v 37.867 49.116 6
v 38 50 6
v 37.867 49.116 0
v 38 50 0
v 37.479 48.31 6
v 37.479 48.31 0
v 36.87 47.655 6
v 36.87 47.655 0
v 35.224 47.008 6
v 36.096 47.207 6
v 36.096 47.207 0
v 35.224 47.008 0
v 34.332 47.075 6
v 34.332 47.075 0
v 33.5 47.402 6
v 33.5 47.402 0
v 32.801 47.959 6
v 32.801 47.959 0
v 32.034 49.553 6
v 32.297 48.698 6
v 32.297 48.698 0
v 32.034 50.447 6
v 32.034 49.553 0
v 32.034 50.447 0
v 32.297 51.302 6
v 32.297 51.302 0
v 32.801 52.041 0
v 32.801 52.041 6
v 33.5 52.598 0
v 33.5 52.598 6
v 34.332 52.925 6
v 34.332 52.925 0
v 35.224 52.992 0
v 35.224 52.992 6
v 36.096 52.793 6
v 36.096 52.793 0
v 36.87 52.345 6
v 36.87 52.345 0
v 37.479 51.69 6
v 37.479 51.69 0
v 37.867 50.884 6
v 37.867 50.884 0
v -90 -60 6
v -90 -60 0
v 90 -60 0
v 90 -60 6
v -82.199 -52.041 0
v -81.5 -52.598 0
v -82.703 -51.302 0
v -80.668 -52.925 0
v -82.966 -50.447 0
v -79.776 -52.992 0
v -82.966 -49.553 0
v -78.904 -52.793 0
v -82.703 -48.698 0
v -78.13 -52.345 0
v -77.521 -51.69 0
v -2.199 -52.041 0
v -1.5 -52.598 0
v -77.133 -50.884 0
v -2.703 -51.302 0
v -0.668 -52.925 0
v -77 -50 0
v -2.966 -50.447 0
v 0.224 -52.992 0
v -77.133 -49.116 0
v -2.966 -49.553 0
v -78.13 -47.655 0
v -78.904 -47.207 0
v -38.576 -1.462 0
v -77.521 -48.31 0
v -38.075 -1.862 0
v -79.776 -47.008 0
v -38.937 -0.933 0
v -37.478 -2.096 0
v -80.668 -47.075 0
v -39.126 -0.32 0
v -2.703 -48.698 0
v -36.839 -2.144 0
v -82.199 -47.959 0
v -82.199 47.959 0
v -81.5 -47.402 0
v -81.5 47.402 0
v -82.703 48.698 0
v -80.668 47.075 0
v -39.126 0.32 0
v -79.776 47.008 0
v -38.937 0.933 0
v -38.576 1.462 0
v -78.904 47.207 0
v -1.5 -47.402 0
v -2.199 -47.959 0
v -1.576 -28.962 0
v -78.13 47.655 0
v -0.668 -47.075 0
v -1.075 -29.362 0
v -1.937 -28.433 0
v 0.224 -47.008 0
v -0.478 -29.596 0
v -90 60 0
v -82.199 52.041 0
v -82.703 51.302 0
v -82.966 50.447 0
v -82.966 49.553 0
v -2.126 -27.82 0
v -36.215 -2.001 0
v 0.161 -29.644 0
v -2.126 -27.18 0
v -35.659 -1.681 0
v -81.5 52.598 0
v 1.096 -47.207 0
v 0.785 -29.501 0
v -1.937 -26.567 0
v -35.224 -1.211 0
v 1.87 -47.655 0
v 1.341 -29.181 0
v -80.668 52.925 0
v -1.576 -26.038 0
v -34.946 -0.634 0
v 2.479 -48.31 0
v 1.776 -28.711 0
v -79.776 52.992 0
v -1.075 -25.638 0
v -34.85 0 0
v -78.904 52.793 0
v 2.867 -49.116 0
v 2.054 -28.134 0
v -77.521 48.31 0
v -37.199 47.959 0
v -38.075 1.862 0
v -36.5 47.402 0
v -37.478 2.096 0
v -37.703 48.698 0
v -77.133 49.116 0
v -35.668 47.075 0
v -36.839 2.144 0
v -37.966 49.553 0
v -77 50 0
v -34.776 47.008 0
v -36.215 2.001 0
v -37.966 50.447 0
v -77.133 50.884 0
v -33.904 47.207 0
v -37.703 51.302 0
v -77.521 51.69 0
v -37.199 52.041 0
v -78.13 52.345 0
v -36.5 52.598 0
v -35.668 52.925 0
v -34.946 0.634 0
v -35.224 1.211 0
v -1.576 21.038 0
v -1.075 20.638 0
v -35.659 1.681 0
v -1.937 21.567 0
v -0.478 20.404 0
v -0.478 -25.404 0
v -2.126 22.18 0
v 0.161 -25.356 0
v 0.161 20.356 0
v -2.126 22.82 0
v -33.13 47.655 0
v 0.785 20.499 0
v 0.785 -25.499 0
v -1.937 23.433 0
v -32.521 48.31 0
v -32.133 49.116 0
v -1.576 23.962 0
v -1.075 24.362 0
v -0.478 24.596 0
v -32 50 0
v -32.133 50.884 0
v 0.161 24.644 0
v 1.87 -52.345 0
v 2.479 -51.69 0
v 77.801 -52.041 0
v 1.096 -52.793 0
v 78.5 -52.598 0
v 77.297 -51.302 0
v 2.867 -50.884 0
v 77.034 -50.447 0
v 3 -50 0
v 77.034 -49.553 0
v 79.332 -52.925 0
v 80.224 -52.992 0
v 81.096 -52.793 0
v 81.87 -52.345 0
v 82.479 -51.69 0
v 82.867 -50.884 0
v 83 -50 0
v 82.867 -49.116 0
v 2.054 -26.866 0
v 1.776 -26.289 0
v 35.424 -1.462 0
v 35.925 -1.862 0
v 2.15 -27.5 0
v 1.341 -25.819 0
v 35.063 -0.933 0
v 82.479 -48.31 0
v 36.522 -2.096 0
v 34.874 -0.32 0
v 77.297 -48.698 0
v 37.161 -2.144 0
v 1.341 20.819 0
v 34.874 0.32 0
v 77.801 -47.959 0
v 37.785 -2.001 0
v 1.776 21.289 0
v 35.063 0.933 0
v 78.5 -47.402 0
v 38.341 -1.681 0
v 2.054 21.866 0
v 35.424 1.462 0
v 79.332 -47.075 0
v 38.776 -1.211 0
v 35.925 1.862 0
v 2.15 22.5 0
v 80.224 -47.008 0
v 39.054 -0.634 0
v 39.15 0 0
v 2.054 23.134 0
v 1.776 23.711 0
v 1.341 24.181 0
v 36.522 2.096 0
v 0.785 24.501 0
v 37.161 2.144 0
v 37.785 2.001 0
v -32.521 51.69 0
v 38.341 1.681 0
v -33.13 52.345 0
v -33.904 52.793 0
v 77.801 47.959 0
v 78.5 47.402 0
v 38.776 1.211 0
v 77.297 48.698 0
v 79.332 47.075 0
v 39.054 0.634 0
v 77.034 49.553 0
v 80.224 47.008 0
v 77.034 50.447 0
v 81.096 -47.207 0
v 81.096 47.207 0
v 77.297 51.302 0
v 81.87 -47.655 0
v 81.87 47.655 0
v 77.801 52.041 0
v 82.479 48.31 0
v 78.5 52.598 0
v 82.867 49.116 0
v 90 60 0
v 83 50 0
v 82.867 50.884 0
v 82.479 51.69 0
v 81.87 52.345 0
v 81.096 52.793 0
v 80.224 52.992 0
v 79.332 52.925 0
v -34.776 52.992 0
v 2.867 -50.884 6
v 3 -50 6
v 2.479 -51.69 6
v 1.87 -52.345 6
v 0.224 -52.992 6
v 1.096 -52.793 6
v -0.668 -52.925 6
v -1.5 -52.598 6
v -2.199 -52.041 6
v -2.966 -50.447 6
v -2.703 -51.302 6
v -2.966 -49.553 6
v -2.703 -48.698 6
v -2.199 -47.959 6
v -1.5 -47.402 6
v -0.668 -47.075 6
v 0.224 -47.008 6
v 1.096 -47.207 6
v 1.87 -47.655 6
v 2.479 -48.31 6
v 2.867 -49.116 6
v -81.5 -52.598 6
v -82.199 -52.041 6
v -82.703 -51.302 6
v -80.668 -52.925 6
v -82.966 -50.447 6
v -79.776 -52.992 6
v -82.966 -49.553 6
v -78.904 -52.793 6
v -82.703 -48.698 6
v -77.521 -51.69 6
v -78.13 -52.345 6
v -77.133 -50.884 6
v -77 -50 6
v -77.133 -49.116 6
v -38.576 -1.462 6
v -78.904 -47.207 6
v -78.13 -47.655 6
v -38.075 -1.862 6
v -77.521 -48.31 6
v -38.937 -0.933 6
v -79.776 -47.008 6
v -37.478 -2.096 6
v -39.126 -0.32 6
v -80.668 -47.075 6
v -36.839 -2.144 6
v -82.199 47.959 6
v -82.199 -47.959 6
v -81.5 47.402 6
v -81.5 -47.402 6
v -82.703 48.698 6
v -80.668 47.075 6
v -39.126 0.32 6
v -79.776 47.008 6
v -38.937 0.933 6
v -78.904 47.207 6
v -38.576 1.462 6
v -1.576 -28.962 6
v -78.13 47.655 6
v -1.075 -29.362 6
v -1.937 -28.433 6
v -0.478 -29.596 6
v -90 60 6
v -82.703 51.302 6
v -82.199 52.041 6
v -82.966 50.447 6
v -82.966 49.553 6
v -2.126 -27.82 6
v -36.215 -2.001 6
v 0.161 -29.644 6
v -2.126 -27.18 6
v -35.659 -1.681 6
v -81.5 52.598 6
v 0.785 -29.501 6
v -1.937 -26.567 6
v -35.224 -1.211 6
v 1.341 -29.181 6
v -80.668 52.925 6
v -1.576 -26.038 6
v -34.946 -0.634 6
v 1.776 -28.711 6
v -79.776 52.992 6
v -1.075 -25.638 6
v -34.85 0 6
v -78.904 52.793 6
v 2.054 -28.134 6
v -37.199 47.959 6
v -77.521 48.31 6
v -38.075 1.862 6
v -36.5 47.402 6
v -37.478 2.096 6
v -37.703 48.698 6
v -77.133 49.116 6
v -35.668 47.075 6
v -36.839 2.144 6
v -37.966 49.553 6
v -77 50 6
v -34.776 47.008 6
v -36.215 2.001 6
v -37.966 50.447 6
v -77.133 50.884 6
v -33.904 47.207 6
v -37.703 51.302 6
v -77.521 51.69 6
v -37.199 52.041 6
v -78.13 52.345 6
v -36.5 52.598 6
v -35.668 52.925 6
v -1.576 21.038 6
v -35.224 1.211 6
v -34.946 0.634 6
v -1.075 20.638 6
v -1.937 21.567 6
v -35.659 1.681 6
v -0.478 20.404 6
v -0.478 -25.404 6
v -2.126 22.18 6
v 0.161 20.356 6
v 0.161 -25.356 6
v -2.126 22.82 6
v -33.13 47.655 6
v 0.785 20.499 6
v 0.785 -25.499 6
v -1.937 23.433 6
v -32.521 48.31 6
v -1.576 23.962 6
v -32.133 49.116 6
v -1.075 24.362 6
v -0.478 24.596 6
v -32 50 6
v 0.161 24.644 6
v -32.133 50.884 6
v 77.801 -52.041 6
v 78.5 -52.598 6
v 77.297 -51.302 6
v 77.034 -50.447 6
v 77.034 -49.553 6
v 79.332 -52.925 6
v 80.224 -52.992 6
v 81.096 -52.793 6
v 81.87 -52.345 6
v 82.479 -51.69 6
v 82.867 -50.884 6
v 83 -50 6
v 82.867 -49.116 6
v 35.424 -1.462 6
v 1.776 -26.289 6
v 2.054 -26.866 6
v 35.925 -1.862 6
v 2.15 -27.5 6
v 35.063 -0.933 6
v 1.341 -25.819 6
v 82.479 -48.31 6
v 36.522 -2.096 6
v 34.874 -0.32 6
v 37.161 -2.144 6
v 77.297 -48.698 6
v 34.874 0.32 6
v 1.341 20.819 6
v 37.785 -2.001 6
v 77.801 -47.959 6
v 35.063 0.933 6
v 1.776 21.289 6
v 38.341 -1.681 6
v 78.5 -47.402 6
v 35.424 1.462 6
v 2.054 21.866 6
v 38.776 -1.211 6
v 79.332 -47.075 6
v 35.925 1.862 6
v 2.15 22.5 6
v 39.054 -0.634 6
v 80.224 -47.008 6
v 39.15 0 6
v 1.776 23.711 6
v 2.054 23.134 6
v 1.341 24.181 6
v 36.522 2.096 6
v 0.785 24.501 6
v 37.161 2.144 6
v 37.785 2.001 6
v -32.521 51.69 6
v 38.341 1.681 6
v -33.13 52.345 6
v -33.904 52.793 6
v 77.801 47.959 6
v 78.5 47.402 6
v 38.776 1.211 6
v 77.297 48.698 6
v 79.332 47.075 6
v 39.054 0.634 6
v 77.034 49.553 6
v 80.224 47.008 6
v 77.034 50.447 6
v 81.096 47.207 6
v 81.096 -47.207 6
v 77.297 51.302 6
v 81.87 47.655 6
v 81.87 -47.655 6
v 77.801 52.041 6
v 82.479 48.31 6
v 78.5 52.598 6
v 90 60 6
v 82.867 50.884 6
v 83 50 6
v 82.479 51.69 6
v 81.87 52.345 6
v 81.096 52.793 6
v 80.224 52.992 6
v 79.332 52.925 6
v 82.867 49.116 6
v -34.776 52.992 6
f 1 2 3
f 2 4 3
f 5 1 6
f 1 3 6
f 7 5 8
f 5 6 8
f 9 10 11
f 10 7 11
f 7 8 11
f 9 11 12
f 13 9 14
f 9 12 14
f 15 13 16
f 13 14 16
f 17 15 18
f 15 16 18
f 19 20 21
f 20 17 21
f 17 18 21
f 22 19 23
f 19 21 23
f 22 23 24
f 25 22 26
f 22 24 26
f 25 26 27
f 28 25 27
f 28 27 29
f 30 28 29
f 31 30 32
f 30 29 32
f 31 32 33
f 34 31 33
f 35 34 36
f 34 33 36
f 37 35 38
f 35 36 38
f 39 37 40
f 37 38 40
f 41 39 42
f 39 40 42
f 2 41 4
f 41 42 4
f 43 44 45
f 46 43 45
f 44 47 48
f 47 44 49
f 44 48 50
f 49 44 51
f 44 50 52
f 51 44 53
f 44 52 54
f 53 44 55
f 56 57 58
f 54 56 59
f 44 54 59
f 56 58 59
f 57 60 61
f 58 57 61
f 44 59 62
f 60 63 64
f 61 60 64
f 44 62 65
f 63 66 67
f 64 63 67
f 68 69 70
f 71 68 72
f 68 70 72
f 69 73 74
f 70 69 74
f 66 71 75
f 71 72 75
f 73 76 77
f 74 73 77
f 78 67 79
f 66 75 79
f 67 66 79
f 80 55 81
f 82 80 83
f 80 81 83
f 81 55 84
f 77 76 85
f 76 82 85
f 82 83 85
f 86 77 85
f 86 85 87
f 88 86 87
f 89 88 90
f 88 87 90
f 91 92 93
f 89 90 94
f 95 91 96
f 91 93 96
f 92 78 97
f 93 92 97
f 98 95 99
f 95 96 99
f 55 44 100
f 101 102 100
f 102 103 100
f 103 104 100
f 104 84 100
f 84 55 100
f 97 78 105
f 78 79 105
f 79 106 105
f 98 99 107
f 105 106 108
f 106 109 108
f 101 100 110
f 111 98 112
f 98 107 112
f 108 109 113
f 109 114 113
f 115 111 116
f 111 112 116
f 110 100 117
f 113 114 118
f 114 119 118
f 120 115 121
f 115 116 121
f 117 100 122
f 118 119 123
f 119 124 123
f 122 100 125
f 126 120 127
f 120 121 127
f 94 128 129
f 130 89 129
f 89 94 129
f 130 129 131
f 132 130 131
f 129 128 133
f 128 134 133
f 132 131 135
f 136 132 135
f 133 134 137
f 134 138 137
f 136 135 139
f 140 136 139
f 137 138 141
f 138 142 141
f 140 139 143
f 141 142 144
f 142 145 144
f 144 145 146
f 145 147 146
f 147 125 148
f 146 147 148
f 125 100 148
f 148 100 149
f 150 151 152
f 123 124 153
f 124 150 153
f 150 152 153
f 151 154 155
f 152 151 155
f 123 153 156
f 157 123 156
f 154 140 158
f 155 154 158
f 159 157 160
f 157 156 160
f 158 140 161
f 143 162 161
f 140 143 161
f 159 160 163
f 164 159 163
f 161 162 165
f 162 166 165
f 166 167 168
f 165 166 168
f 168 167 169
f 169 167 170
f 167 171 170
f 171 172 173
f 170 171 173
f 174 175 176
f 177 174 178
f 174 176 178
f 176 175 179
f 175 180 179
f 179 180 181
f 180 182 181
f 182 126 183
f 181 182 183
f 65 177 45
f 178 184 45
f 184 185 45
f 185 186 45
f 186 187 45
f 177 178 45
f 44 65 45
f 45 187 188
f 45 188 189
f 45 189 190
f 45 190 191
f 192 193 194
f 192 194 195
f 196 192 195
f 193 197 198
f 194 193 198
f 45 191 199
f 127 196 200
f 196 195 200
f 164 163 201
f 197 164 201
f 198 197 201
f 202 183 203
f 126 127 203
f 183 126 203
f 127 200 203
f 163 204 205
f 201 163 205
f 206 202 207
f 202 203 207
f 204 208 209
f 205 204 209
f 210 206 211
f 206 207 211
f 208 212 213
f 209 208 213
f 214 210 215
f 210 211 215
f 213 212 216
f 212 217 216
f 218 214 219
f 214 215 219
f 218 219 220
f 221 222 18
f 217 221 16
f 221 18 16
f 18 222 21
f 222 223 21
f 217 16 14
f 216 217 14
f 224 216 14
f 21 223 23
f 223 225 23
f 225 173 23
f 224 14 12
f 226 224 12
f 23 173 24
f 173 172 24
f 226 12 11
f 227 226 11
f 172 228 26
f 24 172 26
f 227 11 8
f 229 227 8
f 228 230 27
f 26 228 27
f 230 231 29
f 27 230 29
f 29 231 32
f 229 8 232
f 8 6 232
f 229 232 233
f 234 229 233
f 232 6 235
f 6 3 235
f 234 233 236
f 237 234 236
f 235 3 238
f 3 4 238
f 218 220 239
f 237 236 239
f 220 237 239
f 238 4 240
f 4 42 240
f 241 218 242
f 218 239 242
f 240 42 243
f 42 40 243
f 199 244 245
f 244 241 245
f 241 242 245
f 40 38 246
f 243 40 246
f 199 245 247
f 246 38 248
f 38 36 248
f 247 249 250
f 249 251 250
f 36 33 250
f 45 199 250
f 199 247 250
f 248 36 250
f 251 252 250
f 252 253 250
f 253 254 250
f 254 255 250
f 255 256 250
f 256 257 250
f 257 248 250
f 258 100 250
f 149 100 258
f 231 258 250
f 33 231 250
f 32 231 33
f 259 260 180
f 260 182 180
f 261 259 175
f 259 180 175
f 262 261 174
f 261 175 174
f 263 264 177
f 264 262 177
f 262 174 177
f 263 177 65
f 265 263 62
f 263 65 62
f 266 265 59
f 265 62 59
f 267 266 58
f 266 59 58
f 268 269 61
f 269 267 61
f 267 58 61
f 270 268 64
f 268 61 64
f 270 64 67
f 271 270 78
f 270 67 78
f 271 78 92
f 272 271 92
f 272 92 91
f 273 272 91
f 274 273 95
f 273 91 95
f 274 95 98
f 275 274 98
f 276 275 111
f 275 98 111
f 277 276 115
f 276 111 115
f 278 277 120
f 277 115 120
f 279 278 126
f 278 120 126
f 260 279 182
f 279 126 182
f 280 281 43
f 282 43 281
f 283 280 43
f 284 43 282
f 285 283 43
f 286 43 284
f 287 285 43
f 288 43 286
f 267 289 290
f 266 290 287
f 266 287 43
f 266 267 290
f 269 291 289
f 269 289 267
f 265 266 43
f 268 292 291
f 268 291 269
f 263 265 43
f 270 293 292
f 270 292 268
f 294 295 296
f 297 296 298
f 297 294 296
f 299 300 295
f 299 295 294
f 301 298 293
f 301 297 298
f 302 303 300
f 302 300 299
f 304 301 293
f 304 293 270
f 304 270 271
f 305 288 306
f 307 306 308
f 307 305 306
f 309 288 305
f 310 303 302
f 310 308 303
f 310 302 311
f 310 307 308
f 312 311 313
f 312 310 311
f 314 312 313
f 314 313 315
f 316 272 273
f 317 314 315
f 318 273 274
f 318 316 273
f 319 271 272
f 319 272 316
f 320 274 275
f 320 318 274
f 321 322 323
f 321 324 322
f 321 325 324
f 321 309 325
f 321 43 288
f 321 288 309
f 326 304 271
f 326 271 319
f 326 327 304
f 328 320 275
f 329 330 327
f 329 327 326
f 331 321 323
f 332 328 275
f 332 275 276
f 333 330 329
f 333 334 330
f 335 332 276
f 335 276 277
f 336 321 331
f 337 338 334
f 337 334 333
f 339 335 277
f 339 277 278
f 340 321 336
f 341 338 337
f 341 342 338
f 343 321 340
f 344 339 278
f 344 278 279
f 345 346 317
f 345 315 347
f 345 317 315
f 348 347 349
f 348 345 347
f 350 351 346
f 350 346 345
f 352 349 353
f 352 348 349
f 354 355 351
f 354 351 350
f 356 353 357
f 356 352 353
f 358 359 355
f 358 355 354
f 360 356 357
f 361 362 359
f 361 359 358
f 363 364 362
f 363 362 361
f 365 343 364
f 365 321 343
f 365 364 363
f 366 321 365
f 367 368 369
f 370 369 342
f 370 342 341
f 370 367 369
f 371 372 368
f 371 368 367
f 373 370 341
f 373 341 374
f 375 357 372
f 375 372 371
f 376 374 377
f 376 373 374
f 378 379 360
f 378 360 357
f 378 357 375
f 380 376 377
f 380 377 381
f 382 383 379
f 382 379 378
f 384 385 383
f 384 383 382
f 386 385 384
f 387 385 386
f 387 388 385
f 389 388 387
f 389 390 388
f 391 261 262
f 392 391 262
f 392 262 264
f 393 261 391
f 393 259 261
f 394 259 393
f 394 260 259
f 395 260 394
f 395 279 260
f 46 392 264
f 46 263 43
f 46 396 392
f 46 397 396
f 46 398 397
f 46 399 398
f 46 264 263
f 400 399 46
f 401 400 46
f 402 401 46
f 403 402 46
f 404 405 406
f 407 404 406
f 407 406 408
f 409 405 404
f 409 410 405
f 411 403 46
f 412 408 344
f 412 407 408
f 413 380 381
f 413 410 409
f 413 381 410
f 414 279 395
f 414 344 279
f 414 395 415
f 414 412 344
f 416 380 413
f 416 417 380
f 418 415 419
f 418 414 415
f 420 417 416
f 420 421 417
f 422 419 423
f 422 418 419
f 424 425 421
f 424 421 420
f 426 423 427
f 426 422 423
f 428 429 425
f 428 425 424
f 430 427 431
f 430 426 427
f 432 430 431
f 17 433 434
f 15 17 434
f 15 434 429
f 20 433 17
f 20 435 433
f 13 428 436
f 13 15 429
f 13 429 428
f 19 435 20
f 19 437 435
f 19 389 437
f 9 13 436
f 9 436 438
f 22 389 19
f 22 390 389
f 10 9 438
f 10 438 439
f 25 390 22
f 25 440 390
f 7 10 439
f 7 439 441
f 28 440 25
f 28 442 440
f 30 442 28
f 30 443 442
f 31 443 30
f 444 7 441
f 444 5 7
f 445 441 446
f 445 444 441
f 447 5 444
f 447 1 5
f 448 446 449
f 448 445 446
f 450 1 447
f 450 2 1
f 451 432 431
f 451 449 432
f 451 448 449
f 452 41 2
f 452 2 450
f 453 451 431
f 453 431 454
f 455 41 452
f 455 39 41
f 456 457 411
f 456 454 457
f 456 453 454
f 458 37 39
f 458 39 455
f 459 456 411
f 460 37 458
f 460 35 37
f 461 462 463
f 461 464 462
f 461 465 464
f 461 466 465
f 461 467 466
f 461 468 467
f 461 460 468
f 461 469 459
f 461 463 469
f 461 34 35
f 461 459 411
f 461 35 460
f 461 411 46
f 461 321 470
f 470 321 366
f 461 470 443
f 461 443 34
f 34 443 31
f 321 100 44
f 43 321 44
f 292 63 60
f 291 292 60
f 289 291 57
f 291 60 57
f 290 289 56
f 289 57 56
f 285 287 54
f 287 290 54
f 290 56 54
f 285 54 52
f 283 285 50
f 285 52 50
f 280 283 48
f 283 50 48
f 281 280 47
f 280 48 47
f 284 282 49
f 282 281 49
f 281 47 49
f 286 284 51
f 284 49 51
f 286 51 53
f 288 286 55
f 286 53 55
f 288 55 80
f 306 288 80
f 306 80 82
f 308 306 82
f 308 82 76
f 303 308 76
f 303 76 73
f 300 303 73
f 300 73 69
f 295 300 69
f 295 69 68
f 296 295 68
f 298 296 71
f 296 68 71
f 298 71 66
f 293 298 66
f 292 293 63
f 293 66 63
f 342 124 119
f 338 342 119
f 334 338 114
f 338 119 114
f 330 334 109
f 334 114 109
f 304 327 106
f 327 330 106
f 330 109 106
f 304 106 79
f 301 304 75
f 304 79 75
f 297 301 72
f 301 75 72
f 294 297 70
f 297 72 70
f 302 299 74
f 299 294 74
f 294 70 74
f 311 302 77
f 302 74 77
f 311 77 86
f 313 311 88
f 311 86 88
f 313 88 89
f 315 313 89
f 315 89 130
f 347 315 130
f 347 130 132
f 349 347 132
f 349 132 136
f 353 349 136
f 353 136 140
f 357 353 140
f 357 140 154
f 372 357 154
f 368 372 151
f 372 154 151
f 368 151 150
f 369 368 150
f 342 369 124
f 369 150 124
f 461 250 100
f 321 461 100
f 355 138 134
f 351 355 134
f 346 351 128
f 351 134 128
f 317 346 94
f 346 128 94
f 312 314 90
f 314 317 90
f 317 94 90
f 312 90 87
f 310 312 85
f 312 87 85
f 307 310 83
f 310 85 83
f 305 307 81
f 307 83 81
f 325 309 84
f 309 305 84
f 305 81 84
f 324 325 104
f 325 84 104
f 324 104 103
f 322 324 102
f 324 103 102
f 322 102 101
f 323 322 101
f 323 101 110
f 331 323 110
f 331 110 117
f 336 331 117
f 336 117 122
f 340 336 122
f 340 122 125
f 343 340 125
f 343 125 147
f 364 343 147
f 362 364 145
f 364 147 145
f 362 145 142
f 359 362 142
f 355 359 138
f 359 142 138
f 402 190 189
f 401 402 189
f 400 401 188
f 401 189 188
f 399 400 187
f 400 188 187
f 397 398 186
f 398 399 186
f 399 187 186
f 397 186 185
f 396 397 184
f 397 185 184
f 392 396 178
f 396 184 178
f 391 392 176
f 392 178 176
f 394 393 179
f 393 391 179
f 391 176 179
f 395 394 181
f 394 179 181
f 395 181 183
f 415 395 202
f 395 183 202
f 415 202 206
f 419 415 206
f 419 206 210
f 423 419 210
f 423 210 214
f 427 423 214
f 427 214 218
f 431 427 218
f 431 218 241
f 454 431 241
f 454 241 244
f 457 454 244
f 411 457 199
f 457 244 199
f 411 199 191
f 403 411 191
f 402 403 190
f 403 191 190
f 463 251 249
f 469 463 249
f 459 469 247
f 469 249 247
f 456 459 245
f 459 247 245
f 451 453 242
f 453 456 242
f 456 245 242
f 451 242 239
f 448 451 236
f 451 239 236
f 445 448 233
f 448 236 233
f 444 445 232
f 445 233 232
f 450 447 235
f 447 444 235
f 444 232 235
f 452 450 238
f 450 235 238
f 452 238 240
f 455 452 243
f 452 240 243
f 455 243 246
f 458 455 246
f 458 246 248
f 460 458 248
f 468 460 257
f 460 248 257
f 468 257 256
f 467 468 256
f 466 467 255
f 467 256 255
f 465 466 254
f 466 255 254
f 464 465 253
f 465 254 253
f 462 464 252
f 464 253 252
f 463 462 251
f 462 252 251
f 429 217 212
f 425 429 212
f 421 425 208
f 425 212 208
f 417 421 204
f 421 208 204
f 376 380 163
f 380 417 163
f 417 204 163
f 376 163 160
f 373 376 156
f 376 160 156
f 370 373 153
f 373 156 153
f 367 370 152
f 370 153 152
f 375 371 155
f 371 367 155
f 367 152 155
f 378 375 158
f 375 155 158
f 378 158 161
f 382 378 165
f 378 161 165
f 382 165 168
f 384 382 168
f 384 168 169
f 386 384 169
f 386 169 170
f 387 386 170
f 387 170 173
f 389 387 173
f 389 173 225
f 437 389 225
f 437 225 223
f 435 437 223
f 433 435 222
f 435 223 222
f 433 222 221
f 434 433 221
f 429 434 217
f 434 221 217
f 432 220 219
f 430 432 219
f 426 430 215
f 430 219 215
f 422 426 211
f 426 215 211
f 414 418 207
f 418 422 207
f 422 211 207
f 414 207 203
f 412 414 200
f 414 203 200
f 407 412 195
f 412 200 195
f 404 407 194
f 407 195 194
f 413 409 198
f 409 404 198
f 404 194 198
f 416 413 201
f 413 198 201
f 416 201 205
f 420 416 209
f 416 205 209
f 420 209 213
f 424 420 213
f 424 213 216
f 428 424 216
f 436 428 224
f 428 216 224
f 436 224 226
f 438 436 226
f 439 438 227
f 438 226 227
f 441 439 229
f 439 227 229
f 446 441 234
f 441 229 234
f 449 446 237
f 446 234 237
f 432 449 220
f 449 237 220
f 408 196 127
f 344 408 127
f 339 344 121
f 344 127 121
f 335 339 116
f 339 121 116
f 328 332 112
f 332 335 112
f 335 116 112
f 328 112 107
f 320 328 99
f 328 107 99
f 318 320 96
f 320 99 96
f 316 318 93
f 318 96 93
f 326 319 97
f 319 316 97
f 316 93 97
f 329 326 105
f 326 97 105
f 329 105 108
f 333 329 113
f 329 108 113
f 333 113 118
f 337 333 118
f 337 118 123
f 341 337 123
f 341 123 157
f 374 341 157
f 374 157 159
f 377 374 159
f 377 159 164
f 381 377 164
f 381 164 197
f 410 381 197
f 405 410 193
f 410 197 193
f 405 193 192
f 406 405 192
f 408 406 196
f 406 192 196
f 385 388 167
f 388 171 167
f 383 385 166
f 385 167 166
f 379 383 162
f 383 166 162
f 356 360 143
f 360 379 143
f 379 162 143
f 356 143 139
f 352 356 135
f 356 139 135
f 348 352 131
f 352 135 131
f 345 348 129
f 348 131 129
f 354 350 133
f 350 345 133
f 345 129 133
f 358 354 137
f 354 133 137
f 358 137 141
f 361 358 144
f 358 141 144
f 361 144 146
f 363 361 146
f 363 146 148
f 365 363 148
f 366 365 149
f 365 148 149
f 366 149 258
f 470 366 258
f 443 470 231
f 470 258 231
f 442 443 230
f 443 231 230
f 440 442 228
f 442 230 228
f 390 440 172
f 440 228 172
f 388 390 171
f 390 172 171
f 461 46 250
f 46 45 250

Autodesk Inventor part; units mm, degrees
ref_plane "YZ Plane" through (0, 0, 0) normal (1, 0, 0) x (0, 1, 0)
ref_plane "XZ Plane" through (0, 0, 0) normal (0, 1, 0) x (-1, 0, 0)
ref_plane "XY Plane" through (0, 0, 0) normal (0, 0, 1) x (1, 0, 0)
sketch "Sketch1" plane through (0, 0, 0) normal (0, 0, 1) x (1, 0, 0)
  line L0 (-70, 40) -> (70, 40) construction
  line L1 (70, 40) -> (70, -40) construction
  line L2 (70, -40) -> (-70, -40) construction
  line L3 (-70, -40) -> (-70, 40) construction
  line L4 (90, 60) -> (-90, 60)
  line L5 (-90, 60) -> (-90, -60)
  line L6 (-90, -60) -> (90, -60)
  line L7 (90, -60) -> (90, 60)
  circle A0 centre (-80, -50) radius 3
  circle A1 centre (80, 50) radius 3
  circle A2 centre (0, -50) radius 3
  circle A3 centre (80, -50) radius 3
  circle A4 centre (-80, 50) radius 3
  line L8 (0, 60) -> (0, -60) construction
  line L9 (-90, 0) -> (90, 0) construction
  circle A5 centre (-35, 50) radius 3
  circle A6 centre (35, 50) radius 3
  circle A7 centre (0, 22.5) radius 2.15
  circle A8 centre (0, -27.5) radius 2.15
  circle A9 centre (37, 0) radius 2.15
  circle A10 centre (-37, 0) radius 2.15
  point P0 (0, 0)
  point P1 (-70, 0)
  point P2 (0, 40)
  point P3 (0, 0)
  dimension "d0" = 140
  dimension "d1" = 80
  dimension "d2" = 20
  dimension "d3" = 6
  dimension "d4" = 10
  dimension "d5" = 10
  dimension "d8" = 35
  dimension "d9" = 4.3
  dimension "d10" = 74
  dimension "d11" = 50
  dimension "d12" = 27.5
extrude "Extrusion1" add sketch "Sketch1" along normal blind 6
properties part number "top"
